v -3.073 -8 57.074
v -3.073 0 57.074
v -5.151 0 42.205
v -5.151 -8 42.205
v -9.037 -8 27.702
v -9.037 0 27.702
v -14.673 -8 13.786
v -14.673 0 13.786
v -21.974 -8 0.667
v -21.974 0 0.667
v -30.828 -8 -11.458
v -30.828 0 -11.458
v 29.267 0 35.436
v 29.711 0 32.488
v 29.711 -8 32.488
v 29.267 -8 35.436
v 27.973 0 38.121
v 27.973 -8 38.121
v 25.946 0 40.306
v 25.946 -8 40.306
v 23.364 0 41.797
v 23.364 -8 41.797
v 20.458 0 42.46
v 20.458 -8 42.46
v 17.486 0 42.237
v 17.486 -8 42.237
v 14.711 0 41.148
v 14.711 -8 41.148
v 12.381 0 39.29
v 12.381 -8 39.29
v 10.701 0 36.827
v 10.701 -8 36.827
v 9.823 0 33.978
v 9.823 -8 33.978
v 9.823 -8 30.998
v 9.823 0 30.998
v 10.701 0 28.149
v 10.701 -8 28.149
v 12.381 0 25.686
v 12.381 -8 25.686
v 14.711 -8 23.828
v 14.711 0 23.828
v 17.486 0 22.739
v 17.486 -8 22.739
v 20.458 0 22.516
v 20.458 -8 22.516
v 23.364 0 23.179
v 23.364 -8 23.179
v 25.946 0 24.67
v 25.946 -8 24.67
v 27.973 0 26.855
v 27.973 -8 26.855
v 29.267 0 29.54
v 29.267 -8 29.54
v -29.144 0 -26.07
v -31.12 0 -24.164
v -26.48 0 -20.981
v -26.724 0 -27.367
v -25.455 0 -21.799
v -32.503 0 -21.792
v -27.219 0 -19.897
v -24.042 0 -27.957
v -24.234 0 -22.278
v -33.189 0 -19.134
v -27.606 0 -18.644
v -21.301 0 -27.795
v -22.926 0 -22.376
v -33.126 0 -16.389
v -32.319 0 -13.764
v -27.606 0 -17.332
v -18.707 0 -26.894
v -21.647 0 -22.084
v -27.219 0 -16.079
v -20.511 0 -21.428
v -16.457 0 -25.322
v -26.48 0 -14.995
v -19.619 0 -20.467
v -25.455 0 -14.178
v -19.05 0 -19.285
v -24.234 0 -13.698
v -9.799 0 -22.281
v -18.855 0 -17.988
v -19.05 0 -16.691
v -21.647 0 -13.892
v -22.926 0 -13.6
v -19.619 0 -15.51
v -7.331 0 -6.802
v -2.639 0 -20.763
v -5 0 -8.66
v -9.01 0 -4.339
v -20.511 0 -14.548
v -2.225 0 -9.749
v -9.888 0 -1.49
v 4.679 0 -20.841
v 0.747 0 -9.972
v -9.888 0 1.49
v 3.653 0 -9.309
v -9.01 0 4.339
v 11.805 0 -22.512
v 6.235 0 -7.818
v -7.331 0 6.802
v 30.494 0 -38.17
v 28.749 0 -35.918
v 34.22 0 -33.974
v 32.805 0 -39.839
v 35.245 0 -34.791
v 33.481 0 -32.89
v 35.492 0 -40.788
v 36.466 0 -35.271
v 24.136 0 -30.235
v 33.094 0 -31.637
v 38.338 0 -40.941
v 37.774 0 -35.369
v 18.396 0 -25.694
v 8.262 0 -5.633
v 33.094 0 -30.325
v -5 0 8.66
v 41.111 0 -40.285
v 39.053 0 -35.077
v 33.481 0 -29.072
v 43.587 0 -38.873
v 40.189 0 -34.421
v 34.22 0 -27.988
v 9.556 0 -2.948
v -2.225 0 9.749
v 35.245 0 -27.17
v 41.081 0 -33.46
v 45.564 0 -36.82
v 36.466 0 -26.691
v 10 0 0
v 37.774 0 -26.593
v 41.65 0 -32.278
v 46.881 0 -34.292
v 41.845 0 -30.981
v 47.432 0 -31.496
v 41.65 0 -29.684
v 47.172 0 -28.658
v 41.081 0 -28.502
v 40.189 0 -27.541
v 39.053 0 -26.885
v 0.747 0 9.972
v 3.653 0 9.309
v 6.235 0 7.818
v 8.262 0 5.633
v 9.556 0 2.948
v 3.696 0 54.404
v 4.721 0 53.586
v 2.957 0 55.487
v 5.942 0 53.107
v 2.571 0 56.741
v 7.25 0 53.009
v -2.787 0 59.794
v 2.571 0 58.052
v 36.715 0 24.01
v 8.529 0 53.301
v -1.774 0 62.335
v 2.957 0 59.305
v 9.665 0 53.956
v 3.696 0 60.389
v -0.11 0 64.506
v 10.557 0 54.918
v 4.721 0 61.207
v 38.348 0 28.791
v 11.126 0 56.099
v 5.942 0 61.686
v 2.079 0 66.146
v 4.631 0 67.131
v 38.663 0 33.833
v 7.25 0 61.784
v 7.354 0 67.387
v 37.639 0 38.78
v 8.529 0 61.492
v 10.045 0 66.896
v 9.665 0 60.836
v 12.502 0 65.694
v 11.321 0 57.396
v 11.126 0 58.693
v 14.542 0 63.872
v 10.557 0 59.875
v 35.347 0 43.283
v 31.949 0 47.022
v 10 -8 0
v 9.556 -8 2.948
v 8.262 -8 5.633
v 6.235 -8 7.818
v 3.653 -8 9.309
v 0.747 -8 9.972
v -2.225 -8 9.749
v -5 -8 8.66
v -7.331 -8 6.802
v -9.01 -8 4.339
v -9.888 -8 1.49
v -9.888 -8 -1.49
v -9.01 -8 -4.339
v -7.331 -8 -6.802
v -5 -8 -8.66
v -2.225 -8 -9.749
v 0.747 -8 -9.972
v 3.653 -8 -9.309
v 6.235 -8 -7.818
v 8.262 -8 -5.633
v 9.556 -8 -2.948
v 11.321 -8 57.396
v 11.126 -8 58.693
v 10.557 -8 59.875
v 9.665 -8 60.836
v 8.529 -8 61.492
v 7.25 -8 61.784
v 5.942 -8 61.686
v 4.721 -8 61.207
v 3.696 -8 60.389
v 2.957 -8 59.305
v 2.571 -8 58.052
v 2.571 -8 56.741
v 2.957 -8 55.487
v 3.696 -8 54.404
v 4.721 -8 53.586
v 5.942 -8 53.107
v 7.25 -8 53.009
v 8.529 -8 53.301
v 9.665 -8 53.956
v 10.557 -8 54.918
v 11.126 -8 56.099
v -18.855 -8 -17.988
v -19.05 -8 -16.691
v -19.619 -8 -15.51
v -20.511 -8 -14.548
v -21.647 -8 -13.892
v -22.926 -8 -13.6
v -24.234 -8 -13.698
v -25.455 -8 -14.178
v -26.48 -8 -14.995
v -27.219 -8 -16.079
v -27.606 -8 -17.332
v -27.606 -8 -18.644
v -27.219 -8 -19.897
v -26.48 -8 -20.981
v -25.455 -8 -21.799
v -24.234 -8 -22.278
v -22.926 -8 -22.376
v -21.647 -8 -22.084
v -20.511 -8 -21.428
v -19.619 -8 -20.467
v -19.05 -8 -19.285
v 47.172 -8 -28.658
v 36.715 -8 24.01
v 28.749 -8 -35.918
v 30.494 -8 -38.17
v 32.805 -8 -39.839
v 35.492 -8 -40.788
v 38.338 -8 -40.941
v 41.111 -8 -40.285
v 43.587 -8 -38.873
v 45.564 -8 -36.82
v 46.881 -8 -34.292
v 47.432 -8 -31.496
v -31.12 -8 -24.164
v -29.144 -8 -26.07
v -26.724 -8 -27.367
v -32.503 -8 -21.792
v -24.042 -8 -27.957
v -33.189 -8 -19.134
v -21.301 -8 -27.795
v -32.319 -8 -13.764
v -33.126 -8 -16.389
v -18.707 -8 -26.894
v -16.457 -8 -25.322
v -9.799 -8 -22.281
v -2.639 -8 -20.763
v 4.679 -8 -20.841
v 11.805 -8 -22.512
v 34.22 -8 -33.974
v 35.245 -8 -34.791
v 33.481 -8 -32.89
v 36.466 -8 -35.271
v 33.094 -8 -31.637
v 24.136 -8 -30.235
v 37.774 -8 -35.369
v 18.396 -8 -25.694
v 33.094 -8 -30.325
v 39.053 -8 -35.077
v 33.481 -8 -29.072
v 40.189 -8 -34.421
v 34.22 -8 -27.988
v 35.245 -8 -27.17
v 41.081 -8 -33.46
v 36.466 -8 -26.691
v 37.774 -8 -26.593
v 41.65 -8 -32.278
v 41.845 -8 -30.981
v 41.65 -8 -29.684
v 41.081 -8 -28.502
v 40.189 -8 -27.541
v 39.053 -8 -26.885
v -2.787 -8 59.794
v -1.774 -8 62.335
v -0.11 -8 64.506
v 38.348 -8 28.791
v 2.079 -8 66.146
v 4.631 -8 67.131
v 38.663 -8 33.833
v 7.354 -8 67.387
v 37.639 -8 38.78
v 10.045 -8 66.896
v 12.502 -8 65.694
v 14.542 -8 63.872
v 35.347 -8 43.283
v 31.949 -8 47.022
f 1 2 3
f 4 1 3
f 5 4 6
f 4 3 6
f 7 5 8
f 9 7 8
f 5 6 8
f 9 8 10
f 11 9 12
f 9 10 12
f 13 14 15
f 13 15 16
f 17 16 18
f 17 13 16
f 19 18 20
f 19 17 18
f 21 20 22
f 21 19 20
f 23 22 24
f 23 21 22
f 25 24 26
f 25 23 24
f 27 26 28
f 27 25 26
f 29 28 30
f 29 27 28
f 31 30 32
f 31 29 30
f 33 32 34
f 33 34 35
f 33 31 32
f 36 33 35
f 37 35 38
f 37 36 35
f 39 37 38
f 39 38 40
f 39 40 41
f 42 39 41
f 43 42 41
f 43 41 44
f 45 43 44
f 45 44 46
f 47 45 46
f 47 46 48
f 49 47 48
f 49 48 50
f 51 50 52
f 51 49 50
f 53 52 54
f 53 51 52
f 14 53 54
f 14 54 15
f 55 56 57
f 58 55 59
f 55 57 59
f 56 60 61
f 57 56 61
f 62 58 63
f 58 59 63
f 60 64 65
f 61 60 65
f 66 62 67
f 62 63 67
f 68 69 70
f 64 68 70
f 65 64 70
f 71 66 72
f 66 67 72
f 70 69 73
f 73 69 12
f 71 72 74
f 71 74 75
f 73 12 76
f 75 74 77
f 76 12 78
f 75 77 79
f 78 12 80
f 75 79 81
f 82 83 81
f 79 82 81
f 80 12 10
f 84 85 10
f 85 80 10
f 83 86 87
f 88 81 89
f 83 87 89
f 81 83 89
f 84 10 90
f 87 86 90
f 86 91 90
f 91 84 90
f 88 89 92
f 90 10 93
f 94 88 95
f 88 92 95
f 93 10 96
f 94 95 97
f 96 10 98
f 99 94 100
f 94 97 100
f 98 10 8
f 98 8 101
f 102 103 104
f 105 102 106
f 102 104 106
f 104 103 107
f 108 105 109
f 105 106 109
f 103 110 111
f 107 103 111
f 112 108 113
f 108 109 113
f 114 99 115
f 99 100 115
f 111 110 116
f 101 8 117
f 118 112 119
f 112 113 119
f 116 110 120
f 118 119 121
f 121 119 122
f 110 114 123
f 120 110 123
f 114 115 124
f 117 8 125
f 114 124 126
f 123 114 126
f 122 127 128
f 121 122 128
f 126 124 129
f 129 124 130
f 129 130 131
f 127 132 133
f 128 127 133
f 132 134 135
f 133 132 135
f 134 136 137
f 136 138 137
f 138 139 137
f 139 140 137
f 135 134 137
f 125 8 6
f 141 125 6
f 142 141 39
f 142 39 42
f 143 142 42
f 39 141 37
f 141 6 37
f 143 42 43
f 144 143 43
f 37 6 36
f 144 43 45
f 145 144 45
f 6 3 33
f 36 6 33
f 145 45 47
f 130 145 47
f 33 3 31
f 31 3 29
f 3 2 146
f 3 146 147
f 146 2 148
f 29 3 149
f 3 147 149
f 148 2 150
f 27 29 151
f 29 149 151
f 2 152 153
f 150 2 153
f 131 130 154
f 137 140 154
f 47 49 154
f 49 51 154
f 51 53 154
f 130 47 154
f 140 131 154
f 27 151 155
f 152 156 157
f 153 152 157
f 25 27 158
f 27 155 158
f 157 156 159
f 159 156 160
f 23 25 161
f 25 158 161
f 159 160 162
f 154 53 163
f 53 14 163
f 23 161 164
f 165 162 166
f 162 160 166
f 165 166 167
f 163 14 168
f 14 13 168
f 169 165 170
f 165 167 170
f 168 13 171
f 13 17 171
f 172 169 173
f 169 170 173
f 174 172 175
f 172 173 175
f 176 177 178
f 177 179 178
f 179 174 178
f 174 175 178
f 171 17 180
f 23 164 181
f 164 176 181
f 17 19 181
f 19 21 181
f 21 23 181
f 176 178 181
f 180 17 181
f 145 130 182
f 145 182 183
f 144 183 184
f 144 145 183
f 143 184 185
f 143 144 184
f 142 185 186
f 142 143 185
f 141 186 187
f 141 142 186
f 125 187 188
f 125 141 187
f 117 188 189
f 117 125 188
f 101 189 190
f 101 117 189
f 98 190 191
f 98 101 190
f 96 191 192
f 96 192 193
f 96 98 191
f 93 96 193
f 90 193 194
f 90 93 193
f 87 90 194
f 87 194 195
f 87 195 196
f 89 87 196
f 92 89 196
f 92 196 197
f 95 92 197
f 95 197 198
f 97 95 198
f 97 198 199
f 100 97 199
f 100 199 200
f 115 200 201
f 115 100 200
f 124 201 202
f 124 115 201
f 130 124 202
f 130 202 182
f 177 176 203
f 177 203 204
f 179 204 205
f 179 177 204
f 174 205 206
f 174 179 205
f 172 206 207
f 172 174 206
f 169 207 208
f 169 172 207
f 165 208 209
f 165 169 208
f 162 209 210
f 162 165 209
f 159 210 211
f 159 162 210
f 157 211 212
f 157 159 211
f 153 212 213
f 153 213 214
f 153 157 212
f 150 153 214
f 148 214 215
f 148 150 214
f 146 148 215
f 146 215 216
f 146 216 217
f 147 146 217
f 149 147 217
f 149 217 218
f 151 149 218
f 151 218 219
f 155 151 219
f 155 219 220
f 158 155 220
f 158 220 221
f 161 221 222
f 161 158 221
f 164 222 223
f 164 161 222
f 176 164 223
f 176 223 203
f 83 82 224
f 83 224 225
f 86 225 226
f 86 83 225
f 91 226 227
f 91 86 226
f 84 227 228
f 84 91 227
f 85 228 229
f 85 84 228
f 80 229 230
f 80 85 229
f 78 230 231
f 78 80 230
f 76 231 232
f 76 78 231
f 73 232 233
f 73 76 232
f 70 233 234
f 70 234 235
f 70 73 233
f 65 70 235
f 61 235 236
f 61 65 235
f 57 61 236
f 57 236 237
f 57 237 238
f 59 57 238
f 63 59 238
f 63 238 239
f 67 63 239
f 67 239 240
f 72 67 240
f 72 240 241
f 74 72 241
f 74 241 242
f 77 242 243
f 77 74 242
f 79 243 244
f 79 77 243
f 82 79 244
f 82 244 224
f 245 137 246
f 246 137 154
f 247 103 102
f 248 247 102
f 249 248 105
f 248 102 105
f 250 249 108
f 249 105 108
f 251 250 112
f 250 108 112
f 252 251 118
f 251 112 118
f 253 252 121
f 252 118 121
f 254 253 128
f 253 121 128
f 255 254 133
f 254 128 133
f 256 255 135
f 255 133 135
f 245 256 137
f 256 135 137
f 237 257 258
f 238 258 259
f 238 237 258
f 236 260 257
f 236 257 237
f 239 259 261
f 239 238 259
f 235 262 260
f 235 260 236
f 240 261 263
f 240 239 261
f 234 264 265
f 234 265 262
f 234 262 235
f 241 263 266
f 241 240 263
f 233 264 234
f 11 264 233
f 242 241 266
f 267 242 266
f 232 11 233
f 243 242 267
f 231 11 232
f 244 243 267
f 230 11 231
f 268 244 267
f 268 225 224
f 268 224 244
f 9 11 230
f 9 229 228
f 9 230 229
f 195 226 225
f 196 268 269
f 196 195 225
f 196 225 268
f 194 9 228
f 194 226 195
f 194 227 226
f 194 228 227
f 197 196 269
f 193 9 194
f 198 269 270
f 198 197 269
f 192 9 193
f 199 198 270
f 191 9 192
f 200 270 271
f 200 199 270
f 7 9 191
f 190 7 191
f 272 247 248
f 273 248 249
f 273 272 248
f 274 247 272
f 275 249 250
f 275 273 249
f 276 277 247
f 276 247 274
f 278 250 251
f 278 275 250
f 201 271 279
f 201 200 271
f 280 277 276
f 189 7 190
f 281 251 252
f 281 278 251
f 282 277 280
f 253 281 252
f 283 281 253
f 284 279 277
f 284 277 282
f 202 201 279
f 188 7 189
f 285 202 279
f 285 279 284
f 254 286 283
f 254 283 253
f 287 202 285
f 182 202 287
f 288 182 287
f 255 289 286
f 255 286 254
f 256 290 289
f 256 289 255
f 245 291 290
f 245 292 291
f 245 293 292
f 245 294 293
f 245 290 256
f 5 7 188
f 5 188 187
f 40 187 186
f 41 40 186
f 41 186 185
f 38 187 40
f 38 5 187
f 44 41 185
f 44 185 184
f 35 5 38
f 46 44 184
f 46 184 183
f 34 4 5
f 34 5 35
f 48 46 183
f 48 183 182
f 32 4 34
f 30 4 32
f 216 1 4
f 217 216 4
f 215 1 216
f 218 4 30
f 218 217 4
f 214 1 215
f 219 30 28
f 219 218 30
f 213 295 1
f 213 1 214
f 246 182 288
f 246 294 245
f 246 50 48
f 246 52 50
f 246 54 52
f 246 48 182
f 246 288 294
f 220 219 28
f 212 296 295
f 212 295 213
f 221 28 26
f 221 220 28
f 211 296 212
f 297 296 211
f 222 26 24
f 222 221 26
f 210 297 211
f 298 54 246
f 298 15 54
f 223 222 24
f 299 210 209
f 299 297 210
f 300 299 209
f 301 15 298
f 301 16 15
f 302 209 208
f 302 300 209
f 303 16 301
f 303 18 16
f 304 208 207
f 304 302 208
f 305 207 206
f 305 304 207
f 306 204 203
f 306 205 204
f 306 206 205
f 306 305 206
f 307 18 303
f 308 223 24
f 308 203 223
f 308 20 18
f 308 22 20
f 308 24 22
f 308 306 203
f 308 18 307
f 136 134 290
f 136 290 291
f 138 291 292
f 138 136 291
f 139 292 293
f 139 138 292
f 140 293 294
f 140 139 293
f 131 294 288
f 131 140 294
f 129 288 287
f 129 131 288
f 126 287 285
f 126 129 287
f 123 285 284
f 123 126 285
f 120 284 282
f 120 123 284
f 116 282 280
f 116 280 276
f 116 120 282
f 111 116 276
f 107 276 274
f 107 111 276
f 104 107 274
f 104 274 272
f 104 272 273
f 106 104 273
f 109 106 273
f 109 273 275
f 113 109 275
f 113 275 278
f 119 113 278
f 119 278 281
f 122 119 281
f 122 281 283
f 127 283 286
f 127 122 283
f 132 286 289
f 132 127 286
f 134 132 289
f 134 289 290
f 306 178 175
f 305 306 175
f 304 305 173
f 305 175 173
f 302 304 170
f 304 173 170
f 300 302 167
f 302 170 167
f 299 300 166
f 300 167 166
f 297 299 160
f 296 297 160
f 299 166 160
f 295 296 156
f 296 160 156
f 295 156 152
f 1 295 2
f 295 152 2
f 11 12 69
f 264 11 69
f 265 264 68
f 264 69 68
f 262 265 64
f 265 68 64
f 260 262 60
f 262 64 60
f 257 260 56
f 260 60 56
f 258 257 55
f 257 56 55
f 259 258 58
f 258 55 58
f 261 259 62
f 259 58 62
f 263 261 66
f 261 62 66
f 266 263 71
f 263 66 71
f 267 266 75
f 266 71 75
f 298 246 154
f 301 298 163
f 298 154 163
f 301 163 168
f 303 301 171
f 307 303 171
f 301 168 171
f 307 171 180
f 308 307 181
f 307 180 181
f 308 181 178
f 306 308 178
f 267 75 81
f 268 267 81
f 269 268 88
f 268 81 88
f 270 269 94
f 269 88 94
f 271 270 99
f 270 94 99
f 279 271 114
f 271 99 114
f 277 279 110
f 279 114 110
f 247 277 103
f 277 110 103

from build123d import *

# Parameters (mm, degrees)
F0_R     = 4.4
F0_R_2   = 10
F1_DEPTH = 8


# Not quite as in the source:
# - a feature names something its author has since deleted; it is built from what else it names


with BuildPart() as f1:
    # F0 (on Front) → F1 (new body)
    with BuildSketch(Plane.XZ):
        with BuildLine():
            Line((31.9492522213, 47.021704051), (14.5416913837, 63.871923339))
            ThreePointArc((14.5416913837, 63.871923339), (3.3211707837, 66.7258087658), (-3.0733272697, 57.0741177632))
            ThreePointArc((-3.0733272697, 57.0741177632), (-11.6409365793, 20.6574209247), (-30.8284920773, -11.4582676391))
            ThreePointArc((-30.8284920773, -11.4582676391), (-30.197435382, -25.1853746986), (-16.4565083148, -25.3218448705))
            ThreePointArc((-16.4565083148, -25.3218448705), (8.288194067, -21.4806704364), (28.7486613668, -35.9175743588))
            ThreePointArc((28.7486613668, -35.9175743588), (41.111240011, -40.2846954641), (47.1716852414, -28.6581697108))
            Line((47.1716852414, -28.6581697108), (36.7147233028, 24.0100747195))
            ThreePointArc((36.7147233028, 24.0100747195), (38.3163132105, 36.3410020894), (31.9492522213, 47.021704051))
        make_face()
        with Locations((-23.2548138211, -17.9881526052)):
            Circle(F0_R, mode=Mode.SUBTRACT)
        Circle(F0_R_2, mode=Mode.SUBTRACT)
        with Locations((37.4451861789, -30.9809301349)):
            Circle(F0_R, mode=Mode.SUBTRACT)
        with Locations((6.9214779515, 57.3964042673)):
            Circle(F0_R, mode=Mode.SUBTRACT)
        with Locations((19.7110784827, 32.4880498807)):
            Circle(F0_R_2, mode=Mode.SUBTRACT)
    extrude(amount=F1_DEPTH)


solid = f1.part
